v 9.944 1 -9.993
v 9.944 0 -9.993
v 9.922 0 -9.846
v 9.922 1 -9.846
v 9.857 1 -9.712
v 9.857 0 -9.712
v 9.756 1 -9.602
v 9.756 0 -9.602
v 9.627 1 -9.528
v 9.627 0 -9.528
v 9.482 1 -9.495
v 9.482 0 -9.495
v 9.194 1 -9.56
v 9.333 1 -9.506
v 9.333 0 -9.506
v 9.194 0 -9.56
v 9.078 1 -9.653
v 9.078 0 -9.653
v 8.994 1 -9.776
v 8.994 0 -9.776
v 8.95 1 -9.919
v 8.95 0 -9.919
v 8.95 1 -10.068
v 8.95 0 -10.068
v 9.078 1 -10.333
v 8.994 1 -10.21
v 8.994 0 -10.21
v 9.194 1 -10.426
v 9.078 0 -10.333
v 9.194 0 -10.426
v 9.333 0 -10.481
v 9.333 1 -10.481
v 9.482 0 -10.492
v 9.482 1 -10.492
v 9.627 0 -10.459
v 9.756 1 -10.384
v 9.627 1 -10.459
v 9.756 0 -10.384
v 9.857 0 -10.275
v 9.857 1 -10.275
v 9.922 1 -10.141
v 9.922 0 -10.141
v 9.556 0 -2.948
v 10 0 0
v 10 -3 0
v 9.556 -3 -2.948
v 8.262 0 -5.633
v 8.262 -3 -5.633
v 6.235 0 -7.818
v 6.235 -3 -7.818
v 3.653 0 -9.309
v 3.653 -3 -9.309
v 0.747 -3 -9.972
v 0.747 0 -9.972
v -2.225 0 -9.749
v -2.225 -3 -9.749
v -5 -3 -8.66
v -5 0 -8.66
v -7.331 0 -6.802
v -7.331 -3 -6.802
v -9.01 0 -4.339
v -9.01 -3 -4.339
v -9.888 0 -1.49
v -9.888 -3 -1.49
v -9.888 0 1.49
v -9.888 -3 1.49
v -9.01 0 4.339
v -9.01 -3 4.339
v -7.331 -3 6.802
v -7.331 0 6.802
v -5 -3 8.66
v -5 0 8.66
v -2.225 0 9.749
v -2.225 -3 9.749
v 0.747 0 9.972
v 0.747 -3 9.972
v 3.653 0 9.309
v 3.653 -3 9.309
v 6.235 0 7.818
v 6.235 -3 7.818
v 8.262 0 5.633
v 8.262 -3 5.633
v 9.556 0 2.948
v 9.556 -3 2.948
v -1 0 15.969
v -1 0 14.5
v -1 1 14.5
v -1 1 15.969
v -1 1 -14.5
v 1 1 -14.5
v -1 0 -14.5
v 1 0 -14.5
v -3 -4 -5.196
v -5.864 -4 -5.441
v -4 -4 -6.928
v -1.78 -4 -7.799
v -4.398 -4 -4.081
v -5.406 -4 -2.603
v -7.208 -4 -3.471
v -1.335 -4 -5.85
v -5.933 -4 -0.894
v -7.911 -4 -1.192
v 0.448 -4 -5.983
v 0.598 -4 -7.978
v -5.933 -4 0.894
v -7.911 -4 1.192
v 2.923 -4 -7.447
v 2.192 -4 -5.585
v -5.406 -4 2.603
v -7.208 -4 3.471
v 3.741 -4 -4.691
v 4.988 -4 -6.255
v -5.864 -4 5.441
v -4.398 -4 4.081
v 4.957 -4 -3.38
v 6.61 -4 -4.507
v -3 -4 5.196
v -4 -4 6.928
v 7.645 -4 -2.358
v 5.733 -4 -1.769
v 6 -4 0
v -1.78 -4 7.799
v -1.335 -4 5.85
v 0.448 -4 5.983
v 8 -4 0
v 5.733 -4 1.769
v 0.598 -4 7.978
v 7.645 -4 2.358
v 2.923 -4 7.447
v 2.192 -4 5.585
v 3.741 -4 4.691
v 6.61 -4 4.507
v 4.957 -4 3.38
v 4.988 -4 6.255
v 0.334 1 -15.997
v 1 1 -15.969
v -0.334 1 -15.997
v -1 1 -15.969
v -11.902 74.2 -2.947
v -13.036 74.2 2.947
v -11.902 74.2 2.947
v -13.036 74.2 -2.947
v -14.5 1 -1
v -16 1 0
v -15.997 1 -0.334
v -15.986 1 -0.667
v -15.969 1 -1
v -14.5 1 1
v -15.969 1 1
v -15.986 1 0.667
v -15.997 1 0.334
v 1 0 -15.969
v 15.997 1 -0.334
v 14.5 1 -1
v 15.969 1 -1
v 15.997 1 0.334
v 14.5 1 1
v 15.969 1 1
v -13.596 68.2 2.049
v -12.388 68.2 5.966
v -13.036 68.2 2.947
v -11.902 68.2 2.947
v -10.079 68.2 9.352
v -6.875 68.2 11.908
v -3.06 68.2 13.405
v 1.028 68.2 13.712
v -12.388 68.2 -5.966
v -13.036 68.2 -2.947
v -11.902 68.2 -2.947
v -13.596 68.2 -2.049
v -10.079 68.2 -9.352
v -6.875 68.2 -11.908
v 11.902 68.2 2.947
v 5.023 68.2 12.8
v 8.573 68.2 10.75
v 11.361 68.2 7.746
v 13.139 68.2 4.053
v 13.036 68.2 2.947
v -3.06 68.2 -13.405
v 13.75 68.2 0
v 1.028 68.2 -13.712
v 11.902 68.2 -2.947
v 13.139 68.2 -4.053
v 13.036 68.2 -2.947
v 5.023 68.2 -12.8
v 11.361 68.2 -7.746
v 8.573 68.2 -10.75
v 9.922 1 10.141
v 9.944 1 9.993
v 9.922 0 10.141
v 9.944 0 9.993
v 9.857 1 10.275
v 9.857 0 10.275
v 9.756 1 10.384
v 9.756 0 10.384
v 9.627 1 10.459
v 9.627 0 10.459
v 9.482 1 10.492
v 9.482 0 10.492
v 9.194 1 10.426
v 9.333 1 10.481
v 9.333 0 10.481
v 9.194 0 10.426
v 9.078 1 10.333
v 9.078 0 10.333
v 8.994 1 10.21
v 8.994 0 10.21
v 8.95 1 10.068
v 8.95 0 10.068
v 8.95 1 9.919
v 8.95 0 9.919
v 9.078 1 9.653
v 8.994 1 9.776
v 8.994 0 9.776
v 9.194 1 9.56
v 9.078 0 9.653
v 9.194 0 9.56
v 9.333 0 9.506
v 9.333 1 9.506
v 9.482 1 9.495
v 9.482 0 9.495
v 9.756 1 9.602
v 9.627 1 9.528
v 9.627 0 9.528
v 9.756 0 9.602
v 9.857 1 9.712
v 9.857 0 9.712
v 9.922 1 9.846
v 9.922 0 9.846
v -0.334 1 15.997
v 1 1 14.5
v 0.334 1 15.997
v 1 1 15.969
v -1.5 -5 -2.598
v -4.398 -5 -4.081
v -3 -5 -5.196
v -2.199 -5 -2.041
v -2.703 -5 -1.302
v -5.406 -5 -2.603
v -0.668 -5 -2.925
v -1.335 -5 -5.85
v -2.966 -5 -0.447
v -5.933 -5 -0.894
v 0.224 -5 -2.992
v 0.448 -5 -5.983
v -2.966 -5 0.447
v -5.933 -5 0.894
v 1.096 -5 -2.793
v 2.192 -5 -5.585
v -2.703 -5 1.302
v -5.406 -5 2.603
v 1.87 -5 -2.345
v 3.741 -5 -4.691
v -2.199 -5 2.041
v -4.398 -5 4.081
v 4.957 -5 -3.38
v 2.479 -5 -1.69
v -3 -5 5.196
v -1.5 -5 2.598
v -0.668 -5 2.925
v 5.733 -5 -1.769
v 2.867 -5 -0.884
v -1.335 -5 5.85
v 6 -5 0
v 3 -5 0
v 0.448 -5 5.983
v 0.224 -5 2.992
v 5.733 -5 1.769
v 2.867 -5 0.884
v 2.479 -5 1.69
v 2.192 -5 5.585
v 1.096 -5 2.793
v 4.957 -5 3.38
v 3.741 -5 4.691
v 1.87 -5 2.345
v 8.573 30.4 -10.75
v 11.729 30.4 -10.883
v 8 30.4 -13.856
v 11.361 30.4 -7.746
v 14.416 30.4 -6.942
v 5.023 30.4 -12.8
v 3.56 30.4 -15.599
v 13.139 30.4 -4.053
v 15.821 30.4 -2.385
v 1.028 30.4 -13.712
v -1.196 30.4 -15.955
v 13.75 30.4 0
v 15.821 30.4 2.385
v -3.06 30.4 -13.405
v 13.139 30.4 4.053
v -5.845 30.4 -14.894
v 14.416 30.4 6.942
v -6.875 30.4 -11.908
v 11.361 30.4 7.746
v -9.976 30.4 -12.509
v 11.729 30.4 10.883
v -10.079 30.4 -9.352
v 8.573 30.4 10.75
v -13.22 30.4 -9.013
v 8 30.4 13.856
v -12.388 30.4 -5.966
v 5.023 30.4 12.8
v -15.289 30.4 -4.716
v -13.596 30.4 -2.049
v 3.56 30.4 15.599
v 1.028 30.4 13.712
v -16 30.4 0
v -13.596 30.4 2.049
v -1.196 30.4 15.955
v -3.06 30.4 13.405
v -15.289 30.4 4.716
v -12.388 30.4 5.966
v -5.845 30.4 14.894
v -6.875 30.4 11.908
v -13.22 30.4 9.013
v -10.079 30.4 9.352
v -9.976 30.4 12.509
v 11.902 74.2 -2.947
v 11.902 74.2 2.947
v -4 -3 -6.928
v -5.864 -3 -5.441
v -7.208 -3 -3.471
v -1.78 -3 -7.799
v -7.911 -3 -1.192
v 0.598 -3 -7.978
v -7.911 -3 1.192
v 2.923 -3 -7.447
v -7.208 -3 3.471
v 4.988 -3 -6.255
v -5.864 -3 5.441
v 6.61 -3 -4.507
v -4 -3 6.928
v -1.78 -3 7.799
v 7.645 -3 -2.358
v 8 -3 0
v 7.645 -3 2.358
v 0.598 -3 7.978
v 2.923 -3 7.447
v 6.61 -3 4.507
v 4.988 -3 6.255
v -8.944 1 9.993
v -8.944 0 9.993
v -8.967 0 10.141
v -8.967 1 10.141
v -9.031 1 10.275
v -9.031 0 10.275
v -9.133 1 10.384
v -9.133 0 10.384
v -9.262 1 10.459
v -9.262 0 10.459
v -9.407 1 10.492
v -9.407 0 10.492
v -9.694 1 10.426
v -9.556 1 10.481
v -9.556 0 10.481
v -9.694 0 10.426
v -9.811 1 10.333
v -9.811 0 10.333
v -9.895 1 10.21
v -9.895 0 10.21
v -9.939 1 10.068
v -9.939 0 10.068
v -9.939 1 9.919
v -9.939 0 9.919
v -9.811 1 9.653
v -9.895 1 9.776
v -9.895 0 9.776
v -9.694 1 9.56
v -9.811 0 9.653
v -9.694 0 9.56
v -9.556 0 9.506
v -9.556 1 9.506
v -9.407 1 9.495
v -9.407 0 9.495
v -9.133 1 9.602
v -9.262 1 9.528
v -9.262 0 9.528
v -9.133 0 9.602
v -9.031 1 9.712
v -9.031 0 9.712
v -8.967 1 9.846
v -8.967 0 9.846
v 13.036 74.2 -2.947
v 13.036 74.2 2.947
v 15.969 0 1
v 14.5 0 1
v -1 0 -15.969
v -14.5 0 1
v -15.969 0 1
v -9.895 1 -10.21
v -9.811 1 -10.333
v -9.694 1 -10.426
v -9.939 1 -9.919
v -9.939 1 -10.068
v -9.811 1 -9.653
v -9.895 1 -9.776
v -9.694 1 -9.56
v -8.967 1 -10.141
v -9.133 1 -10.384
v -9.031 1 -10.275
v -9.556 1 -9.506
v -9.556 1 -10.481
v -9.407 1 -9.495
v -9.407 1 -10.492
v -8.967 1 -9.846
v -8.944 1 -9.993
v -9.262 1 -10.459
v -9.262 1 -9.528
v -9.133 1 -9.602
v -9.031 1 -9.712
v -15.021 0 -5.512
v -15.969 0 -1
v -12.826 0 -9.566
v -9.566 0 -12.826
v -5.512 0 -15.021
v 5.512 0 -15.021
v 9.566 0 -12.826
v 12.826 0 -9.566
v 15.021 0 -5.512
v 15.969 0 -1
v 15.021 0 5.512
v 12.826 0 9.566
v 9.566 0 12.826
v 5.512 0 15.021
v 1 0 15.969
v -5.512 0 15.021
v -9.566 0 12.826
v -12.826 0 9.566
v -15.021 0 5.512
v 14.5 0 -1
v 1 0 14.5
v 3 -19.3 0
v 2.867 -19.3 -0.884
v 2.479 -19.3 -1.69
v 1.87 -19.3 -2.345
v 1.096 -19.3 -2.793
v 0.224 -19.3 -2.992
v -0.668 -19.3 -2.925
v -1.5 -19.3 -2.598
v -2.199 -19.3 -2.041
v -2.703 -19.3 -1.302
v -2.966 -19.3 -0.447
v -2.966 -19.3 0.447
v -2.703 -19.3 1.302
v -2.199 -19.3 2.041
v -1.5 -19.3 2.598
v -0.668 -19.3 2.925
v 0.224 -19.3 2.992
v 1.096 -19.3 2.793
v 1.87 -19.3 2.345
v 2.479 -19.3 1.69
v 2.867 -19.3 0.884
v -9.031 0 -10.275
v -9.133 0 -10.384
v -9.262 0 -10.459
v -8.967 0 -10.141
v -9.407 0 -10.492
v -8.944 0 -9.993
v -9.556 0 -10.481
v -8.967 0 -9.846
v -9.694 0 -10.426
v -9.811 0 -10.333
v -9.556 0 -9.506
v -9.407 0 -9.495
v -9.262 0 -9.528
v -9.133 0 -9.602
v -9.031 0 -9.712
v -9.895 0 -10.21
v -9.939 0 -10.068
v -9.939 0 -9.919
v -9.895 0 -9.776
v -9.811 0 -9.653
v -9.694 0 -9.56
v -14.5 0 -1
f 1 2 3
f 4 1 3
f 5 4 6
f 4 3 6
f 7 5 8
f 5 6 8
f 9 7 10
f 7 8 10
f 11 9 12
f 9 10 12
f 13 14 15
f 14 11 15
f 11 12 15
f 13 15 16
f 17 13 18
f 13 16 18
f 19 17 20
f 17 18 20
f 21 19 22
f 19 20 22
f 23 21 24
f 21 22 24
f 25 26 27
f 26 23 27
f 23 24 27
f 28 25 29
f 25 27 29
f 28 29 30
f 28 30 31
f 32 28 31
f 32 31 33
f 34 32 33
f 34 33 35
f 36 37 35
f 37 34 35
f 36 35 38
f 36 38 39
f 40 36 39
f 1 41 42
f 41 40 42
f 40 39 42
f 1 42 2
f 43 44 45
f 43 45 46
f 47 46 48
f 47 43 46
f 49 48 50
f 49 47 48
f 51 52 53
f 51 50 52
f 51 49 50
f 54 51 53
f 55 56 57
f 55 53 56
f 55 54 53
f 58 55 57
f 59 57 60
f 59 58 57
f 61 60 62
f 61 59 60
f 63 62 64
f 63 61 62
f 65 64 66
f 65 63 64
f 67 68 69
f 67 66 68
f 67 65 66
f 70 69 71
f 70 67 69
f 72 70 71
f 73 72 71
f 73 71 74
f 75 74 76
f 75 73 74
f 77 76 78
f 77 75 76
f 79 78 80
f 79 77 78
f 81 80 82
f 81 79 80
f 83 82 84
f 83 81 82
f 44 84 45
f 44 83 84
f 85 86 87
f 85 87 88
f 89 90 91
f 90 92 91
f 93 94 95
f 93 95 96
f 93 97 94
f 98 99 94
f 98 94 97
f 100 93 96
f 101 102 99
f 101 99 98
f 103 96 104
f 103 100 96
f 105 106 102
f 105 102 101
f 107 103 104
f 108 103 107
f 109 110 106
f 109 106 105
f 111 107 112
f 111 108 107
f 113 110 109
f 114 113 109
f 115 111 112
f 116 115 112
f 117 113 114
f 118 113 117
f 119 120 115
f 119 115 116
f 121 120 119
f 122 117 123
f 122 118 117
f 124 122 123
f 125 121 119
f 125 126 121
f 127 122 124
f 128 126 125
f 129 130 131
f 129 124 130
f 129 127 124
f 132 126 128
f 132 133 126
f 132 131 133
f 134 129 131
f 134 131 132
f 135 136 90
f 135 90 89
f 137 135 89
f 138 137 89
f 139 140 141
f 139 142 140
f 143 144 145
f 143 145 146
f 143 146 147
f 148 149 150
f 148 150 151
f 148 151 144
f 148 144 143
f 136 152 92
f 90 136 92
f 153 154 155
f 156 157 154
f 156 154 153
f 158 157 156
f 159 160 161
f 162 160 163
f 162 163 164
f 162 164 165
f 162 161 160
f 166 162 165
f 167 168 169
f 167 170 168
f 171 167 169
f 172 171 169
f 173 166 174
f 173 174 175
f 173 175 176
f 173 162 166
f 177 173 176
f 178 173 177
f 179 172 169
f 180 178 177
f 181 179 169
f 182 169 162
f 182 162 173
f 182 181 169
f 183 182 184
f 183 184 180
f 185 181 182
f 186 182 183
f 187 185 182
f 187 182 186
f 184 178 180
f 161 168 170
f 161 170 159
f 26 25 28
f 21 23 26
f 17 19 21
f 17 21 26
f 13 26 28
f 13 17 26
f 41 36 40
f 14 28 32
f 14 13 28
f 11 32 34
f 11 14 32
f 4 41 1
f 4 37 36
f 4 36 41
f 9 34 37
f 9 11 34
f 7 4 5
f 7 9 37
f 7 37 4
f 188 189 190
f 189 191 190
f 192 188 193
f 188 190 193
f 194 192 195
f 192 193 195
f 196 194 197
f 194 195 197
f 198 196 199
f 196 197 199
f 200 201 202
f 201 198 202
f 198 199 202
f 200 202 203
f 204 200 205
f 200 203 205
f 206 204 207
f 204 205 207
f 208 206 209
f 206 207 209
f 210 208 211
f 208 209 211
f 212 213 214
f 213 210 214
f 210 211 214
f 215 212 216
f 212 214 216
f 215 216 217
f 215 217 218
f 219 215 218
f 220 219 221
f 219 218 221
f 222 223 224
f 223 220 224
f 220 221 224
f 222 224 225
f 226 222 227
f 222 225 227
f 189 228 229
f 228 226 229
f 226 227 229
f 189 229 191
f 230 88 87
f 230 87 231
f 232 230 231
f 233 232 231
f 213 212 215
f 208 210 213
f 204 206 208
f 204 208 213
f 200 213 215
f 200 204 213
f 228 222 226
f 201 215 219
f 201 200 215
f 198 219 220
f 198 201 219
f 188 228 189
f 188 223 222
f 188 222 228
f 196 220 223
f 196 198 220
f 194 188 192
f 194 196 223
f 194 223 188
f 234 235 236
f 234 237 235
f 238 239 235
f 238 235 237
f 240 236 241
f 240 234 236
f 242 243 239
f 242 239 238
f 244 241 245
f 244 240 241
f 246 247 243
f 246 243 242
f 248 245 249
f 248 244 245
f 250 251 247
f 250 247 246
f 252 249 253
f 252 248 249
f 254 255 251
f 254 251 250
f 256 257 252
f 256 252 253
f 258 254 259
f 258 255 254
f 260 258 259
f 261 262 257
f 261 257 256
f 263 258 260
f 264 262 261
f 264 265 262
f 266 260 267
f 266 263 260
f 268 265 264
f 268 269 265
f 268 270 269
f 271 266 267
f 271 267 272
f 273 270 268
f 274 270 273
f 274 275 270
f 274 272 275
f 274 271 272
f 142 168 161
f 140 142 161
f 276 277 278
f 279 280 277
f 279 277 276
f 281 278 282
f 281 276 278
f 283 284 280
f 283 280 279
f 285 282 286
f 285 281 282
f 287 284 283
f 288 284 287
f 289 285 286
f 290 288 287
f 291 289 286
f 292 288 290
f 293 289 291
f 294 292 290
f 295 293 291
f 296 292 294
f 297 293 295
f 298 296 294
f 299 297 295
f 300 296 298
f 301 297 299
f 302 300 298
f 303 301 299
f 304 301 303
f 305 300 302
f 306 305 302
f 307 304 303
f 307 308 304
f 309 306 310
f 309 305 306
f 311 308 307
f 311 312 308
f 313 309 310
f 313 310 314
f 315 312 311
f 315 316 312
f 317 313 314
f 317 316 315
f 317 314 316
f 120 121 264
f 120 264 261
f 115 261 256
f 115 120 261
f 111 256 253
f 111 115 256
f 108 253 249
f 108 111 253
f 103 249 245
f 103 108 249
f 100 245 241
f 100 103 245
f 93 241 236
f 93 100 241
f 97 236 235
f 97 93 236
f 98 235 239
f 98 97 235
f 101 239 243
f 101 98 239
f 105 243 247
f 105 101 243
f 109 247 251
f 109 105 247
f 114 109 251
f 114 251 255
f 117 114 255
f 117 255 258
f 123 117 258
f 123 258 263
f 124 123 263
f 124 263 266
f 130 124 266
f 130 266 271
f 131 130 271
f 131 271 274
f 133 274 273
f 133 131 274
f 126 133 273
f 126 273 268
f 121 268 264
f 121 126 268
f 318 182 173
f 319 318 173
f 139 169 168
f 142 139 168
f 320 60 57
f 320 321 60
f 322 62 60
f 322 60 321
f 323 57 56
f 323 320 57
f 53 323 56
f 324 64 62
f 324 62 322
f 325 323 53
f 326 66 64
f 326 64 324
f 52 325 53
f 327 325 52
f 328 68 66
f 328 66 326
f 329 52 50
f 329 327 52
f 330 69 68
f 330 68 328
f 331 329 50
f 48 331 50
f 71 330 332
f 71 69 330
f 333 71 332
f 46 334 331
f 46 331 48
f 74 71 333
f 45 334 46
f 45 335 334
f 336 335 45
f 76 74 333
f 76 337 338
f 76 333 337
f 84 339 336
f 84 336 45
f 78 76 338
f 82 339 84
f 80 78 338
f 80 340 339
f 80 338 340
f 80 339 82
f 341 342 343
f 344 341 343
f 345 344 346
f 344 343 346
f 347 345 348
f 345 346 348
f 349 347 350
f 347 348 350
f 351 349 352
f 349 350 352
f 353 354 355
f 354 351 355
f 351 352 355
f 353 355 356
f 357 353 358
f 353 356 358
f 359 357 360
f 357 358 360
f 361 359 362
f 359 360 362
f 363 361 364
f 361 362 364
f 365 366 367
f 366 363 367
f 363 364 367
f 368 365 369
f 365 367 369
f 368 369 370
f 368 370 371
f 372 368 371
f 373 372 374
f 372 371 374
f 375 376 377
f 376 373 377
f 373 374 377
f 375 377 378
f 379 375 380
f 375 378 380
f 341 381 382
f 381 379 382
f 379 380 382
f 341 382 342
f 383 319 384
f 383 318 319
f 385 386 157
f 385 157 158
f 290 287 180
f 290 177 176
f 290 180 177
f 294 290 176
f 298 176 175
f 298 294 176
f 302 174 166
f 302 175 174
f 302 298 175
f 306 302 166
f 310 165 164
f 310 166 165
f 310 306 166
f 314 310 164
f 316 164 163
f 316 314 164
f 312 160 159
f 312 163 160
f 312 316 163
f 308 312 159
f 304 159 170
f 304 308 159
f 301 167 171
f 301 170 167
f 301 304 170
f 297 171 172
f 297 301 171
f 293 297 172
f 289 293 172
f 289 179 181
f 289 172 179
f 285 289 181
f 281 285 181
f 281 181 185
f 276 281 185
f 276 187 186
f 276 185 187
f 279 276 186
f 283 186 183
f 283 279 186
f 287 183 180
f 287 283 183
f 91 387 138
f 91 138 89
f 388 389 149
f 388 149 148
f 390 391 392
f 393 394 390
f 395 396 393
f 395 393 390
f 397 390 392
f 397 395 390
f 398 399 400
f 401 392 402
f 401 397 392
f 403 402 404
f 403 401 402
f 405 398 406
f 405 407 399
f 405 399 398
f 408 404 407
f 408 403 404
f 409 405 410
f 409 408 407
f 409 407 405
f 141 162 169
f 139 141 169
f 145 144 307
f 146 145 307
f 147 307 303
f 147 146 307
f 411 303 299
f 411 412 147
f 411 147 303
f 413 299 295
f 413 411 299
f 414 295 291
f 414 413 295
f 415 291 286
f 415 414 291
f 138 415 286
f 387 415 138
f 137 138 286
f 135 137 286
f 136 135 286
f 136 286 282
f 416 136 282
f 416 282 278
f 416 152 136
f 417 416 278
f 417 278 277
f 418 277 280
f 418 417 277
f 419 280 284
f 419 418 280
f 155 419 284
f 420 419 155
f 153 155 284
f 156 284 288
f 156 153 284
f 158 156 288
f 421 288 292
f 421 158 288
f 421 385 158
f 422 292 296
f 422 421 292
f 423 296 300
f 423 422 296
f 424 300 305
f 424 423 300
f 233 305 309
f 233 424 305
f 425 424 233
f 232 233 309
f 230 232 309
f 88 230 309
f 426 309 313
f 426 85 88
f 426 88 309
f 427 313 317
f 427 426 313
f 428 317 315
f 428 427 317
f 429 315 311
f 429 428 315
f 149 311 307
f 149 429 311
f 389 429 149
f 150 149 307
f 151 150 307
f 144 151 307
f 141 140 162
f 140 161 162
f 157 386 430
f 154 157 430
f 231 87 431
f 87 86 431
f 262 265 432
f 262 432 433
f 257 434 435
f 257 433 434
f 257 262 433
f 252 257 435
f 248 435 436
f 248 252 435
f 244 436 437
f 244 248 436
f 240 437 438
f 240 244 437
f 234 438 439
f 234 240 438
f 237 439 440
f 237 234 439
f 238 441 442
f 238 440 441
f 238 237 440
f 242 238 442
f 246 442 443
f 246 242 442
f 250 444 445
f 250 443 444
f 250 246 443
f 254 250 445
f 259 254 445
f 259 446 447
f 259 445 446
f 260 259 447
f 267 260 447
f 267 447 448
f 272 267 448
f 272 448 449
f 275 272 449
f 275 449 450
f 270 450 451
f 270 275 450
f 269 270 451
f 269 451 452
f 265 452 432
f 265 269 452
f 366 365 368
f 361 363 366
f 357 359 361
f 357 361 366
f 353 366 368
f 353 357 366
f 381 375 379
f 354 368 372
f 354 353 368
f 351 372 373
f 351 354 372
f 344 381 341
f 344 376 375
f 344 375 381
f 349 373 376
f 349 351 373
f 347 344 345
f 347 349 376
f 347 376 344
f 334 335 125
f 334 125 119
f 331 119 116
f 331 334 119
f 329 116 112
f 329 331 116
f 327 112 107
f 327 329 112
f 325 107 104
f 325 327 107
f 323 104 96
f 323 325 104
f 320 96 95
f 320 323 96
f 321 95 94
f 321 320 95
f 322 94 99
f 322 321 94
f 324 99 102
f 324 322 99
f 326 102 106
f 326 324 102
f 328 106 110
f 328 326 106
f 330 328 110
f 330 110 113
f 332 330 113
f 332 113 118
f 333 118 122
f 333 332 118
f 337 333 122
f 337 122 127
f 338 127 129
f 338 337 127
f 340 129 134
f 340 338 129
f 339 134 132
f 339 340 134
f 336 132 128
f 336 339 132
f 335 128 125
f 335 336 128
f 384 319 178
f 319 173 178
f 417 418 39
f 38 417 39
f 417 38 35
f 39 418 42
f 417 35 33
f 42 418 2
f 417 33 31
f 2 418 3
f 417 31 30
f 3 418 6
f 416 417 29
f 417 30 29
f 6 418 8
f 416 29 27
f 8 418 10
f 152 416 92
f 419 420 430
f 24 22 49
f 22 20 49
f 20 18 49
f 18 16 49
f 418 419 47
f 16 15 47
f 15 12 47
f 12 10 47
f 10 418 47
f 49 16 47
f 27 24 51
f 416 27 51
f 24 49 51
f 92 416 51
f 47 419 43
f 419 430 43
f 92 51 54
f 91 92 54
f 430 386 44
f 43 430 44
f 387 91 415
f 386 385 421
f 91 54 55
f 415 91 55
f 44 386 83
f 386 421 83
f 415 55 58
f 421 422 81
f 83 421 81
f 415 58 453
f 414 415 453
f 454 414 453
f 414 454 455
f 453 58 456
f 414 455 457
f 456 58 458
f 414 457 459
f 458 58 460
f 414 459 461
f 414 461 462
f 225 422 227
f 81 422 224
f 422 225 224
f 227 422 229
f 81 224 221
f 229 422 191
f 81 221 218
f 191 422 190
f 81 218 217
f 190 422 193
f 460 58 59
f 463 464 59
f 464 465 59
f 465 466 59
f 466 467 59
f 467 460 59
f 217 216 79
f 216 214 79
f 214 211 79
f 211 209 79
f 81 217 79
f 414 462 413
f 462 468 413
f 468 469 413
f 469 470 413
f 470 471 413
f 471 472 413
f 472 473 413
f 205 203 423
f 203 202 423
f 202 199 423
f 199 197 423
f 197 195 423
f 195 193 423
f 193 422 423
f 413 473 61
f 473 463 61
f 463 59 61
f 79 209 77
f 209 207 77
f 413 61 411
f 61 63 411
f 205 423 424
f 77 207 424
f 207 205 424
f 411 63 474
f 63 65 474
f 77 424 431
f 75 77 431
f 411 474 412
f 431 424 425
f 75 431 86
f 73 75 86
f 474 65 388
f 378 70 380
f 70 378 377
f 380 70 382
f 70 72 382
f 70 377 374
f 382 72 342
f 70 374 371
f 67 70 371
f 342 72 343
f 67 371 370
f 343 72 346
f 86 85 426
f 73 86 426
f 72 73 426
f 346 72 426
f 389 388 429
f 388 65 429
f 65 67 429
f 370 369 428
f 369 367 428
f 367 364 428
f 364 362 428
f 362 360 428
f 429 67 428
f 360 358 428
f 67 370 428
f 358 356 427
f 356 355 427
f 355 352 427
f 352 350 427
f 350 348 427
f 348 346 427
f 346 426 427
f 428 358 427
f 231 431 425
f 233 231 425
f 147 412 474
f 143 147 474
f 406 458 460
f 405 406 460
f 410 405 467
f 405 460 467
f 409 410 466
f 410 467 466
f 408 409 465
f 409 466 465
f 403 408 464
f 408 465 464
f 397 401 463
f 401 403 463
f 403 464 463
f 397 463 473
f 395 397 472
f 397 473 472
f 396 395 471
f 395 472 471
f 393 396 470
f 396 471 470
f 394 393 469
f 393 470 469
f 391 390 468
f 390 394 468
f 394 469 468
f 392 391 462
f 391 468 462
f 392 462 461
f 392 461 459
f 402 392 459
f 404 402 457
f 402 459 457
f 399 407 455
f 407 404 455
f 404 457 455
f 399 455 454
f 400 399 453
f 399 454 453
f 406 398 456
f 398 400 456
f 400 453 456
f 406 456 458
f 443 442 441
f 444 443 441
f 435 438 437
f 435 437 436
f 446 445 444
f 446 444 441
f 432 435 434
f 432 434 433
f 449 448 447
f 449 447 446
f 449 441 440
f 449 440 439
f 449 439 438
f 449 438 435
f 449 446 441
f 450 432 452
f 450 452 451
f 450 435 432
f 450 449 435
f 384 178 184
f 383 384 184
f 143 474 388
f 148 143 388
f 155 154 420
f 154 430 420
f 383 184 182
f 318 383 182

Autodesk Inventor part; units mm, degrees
ref_plane "XZ Plane" through (0, 0, 0) normal (0, 1, 0) x (-1, 0, 0)
sketch "Sketch1" plane through (0, 0, 0) normal (0, 1, 0) x (-1, 0, 0)
  circle A0 centre (0, 0) radius 16
  dimension "d0" = 32
extrude "Extrusion1" add sketch "Sketch1" along normal blind 30.4
sketch "Sketch2" plane through (0, 30.4, 0) normal (0, 1, 0) x (1, 0, 0)
  circle A0 centre (0, 0) radius 13.75
  dimension "d3" = 27.5
extrude "Extrusion2" add sketch "Sketch2" along normal blind 37.8
sketch "Sketch3" plane through (0, 0, 0) normal (0, -1, 0) x (1, 0, 0)
  circle A0 centre (0, 0) radius 10
  dimension "d6" = 20
extrude "Extrusion3" add sketch "Sketch3" along normal blind 3
sketch "Sketch4" plane through (0, -3, 0) normal (0, -1, 0) x (1, 0, 0)
  circle A0 centre (0, 0) radius 8
  dimension "d9" = 16
extrude "Extrusion4" add sketch "Sketch4" along normal blind 1
sketch "Sketch5" plane through (0, -4, 0) normal (0, -1, 0) x (1, 0, 0)
  circle A0 centre (0, 0) radius 6
  dimension "d12" = 12
extrude "Extrusion5" add sketch "Sketch5" along normal blind 1
sketch "Sketch6" plane through (0, -5, 0) normal (0, -1, 0) x (1, 0, 0)
  circle A0 centre (0, 0) radius 3
  dimension "d15" = 6
extrude "Extrusion6" add sketch "Sketch6" along normal blind 14.3
sketch "Sketch7" plane through (0, 68.2, 0) normal (0, 1, 0) x (1, 0, 0)
  line L0 (-9.25, -6) -> (-10.75, -6)
  line L1 (-10.75, -6) -> (-10.75, 6)
  line L2 (-10.75, 6) -> (-9.25, 6)
  line L3 (-9.25, 6) -> (-9.25, -6)
  circle A0 centre (0, 0) radius 10 projected
  line L4 (-9.25, -6) -> (-10.75, 6) construction
  line L5 (-10.75, -6) -> (-9.25, 6) construction
  point P0 (-10, 0)
  dimension "d18" = 12
  dimension "d19" = 1.5
extrude "Extrusion7" [suppressed]
sketch "Sketch8" plane through (-10.75, 68.2, -6) normal (-1, 0, 0) x (0, 0, 1)
  line L0 (1.5, 11.5) -> (10.5, 11.5)
  line L1 (10.5, 11.5) -> (10.5, 8.812)
  line L2 (10.5, 8.812) -> (1.5, 8.812)
  line L3 (1.5, 8.812) -> (1.5, 11.5)
  line L4 (0, 12.5) -> (12, 12.5) projected
  line L5 (0, 0) -> (0, 12.5) projected
  line L6 (12, 0) -> (12, 12.5) projected
  point P0 (6, -68.2)
  dimension "d22" = 1
  dimension "d23" = 1.5
  dimension "d24" = 1.5
extrude "Extrusion8" [suppressed]
sketch "Sketch9" plane through (0, 0, 0) normal (0, -1, 0) x (1, 0, 0)
  circle A0 centre (0, 0) radius 13.75 projected
  line L0 (-9.4443, 9.9933) -> (9.4443, 9.9933)
  line L1 (9.4443, 9.9933) -> (9.4443, -9.9933)
  line L2 (9.4443, -9.9933) -> (-9.4443, -9.9933)
  line L3 (-9.4443, -9.9933) -> (-9.4443, 9.9933)
  line L4 (-9.4443, 9.9933) -> (9.4443, -9.9933) construction
  line L5 (9.4443, 9.9933) -> (-9.4443, -9.9933) construction
  circle A1 centre (9.4443, -9.9933) radius 0.5
  circle A2 centre (-9.4443, -9.9933) radius 0.5
  circle A3 centre (-9.4443, 9.9933) radius 0.5
  circle A4 centre (9.4443, 9.9933) radius 0.5
  dimension "d27" = 1
  dimension "d28" = 1
  dimension "d29" = 1
  dimension "d30" = 1
extrude "Extrusion9" cut sketch "Sketch9" against normal blind 1 contours A4 L1 A0 | A0 A4 | A1 A0 | A0 L1 A1 | L0 A4 A0 | L1 A4 L0 | L2 A1 L1 | A0 A1 L2 | A3 L0 A0 | A0 A3 | A3 L3 L0 | A2 A0 | A0 L2 A2 | L2 L3 A2 | L3 A3 A0 | A0 A2 L3
sketch "Sketch10" plane through (0, 0, 0) normal (0, -1, 0) x (1, 0, 0)
  circle A0 centre (0, 0) radius 16 projected
  line L0 (0, 16) -> (0, 14.5)
  line L1 (0, 14.5) -> (-1, 14.5)
  line L2 (-1, 14.5) -> (-1, 16)
  line L3 (-1, 16) -> (0, 16)
  line L4 (0, 16) -> (0, 14.5)
  line L5 (0, 14.5) -> (1, 14.5)
  line L6 (1, 14.5) -> (1, 16)
  line L7 (1, 16) -> (0, 16)
  dimension "d33" = 1
  dimension "d34" = 1
  dimension "d35" = 1.5
extrude "Extrusion10" cut sketch "Sketch10" against normal blind 1 contours L6 L5 L0 A0 | A0 L7 L6 | L2 L3 A0 | A0 L0 L1 L2
mirror "Mirror1" about plane through (0, 0, 0) normal (0, 0, 1) of "Extrusion10"
sketch "Sketch11" plane through (0, 0, 0) normal (0, -1, 0) x (1, 0, 0)
  arc A0 (1, -15.9687) -> (1, 15.9687) centre (0, 0) ccw projected
  line L0 (16, 0) -> (14.5, 0)
  line L1 (14.5, 0) -> (14.5, 1)
  line L2 (14.5, 1) -> (16, 1)
  line L3 (16, 1) -> (16, 0)
  line L4 (16, 0) -> (14.5, 0)
  line L5 (14.5, 0) -> (14.5, -1)
  line L6 (14.5, -1) -> (16, -1)
  line L7 (16, -1) -> (16, 0)
  dimension "d38" = 1
  dimension "d39" = 1
  dimension "d40" = 1.5
extrude "Extrusion11" cut sketch "Sketch11" against normal blind 1
mirror "Mirror2" about plane through (0, 0, 0) normal (1, 0, 0) of "Extrusion11"
sketch "Sketch12" plane through (0, 68.2, 0) normal (0, 1, 0) x (1, 0, 0)
  line L0 (-13.0359, 2.9472) -> (-13.0359, -2.9472)
  line L1 (-13.0359, -2.9472) -> (-11.9023, -2.9472)
  line L2 (-11.9023, -2.9472) -> (-11.9023, 2.9472)
  line L3 (-11.9023, 2.9472) -> (-13.0359, 2.9472)
  line L4 (-13.0359, 2.9472) -> (-11.9023, -2.9472) construction
  line L5 (-13.0359, -2.9472) -> (-11.9023, 2.9472) construction
  point P0 (0, 0)
  point P1 (-12.4691, 0)
extrude "Extrusion12" add sketch "Sketch12" along normal blind 6
ref_plane "Work Plane1" through (0, 30.4, 13.75) normal (0, 0, 1) x (1, 0, 0)
ref_plane "Work Plane3" through (0, 30.4, 0) normal (0, 0, 1) x (1, 0, 0)
ref_plane "Work Plane2" through (0, 30.4, -13.75) normal (0, 0, 1) x (1, 0, 0)
ref_plane "Work Plane4" through (-13.75, 30.4, 0) normal (1, 0, 0) x (0, 1, 0)
ref_plane "Work Plane6" through (0, 30.4, 0) normal (1, 0, 0) x (0, 1, 0)
ref_plane "Work Plane5" through (13.75, 30.4, 0) normal (1, 0, 0) x (0, 1, 0)
mirror "Mirror3" about plane through (0, 30.4, 0) normal (1, 0, 0) of "Extrusion12"
properties part number "Drive Motor"
